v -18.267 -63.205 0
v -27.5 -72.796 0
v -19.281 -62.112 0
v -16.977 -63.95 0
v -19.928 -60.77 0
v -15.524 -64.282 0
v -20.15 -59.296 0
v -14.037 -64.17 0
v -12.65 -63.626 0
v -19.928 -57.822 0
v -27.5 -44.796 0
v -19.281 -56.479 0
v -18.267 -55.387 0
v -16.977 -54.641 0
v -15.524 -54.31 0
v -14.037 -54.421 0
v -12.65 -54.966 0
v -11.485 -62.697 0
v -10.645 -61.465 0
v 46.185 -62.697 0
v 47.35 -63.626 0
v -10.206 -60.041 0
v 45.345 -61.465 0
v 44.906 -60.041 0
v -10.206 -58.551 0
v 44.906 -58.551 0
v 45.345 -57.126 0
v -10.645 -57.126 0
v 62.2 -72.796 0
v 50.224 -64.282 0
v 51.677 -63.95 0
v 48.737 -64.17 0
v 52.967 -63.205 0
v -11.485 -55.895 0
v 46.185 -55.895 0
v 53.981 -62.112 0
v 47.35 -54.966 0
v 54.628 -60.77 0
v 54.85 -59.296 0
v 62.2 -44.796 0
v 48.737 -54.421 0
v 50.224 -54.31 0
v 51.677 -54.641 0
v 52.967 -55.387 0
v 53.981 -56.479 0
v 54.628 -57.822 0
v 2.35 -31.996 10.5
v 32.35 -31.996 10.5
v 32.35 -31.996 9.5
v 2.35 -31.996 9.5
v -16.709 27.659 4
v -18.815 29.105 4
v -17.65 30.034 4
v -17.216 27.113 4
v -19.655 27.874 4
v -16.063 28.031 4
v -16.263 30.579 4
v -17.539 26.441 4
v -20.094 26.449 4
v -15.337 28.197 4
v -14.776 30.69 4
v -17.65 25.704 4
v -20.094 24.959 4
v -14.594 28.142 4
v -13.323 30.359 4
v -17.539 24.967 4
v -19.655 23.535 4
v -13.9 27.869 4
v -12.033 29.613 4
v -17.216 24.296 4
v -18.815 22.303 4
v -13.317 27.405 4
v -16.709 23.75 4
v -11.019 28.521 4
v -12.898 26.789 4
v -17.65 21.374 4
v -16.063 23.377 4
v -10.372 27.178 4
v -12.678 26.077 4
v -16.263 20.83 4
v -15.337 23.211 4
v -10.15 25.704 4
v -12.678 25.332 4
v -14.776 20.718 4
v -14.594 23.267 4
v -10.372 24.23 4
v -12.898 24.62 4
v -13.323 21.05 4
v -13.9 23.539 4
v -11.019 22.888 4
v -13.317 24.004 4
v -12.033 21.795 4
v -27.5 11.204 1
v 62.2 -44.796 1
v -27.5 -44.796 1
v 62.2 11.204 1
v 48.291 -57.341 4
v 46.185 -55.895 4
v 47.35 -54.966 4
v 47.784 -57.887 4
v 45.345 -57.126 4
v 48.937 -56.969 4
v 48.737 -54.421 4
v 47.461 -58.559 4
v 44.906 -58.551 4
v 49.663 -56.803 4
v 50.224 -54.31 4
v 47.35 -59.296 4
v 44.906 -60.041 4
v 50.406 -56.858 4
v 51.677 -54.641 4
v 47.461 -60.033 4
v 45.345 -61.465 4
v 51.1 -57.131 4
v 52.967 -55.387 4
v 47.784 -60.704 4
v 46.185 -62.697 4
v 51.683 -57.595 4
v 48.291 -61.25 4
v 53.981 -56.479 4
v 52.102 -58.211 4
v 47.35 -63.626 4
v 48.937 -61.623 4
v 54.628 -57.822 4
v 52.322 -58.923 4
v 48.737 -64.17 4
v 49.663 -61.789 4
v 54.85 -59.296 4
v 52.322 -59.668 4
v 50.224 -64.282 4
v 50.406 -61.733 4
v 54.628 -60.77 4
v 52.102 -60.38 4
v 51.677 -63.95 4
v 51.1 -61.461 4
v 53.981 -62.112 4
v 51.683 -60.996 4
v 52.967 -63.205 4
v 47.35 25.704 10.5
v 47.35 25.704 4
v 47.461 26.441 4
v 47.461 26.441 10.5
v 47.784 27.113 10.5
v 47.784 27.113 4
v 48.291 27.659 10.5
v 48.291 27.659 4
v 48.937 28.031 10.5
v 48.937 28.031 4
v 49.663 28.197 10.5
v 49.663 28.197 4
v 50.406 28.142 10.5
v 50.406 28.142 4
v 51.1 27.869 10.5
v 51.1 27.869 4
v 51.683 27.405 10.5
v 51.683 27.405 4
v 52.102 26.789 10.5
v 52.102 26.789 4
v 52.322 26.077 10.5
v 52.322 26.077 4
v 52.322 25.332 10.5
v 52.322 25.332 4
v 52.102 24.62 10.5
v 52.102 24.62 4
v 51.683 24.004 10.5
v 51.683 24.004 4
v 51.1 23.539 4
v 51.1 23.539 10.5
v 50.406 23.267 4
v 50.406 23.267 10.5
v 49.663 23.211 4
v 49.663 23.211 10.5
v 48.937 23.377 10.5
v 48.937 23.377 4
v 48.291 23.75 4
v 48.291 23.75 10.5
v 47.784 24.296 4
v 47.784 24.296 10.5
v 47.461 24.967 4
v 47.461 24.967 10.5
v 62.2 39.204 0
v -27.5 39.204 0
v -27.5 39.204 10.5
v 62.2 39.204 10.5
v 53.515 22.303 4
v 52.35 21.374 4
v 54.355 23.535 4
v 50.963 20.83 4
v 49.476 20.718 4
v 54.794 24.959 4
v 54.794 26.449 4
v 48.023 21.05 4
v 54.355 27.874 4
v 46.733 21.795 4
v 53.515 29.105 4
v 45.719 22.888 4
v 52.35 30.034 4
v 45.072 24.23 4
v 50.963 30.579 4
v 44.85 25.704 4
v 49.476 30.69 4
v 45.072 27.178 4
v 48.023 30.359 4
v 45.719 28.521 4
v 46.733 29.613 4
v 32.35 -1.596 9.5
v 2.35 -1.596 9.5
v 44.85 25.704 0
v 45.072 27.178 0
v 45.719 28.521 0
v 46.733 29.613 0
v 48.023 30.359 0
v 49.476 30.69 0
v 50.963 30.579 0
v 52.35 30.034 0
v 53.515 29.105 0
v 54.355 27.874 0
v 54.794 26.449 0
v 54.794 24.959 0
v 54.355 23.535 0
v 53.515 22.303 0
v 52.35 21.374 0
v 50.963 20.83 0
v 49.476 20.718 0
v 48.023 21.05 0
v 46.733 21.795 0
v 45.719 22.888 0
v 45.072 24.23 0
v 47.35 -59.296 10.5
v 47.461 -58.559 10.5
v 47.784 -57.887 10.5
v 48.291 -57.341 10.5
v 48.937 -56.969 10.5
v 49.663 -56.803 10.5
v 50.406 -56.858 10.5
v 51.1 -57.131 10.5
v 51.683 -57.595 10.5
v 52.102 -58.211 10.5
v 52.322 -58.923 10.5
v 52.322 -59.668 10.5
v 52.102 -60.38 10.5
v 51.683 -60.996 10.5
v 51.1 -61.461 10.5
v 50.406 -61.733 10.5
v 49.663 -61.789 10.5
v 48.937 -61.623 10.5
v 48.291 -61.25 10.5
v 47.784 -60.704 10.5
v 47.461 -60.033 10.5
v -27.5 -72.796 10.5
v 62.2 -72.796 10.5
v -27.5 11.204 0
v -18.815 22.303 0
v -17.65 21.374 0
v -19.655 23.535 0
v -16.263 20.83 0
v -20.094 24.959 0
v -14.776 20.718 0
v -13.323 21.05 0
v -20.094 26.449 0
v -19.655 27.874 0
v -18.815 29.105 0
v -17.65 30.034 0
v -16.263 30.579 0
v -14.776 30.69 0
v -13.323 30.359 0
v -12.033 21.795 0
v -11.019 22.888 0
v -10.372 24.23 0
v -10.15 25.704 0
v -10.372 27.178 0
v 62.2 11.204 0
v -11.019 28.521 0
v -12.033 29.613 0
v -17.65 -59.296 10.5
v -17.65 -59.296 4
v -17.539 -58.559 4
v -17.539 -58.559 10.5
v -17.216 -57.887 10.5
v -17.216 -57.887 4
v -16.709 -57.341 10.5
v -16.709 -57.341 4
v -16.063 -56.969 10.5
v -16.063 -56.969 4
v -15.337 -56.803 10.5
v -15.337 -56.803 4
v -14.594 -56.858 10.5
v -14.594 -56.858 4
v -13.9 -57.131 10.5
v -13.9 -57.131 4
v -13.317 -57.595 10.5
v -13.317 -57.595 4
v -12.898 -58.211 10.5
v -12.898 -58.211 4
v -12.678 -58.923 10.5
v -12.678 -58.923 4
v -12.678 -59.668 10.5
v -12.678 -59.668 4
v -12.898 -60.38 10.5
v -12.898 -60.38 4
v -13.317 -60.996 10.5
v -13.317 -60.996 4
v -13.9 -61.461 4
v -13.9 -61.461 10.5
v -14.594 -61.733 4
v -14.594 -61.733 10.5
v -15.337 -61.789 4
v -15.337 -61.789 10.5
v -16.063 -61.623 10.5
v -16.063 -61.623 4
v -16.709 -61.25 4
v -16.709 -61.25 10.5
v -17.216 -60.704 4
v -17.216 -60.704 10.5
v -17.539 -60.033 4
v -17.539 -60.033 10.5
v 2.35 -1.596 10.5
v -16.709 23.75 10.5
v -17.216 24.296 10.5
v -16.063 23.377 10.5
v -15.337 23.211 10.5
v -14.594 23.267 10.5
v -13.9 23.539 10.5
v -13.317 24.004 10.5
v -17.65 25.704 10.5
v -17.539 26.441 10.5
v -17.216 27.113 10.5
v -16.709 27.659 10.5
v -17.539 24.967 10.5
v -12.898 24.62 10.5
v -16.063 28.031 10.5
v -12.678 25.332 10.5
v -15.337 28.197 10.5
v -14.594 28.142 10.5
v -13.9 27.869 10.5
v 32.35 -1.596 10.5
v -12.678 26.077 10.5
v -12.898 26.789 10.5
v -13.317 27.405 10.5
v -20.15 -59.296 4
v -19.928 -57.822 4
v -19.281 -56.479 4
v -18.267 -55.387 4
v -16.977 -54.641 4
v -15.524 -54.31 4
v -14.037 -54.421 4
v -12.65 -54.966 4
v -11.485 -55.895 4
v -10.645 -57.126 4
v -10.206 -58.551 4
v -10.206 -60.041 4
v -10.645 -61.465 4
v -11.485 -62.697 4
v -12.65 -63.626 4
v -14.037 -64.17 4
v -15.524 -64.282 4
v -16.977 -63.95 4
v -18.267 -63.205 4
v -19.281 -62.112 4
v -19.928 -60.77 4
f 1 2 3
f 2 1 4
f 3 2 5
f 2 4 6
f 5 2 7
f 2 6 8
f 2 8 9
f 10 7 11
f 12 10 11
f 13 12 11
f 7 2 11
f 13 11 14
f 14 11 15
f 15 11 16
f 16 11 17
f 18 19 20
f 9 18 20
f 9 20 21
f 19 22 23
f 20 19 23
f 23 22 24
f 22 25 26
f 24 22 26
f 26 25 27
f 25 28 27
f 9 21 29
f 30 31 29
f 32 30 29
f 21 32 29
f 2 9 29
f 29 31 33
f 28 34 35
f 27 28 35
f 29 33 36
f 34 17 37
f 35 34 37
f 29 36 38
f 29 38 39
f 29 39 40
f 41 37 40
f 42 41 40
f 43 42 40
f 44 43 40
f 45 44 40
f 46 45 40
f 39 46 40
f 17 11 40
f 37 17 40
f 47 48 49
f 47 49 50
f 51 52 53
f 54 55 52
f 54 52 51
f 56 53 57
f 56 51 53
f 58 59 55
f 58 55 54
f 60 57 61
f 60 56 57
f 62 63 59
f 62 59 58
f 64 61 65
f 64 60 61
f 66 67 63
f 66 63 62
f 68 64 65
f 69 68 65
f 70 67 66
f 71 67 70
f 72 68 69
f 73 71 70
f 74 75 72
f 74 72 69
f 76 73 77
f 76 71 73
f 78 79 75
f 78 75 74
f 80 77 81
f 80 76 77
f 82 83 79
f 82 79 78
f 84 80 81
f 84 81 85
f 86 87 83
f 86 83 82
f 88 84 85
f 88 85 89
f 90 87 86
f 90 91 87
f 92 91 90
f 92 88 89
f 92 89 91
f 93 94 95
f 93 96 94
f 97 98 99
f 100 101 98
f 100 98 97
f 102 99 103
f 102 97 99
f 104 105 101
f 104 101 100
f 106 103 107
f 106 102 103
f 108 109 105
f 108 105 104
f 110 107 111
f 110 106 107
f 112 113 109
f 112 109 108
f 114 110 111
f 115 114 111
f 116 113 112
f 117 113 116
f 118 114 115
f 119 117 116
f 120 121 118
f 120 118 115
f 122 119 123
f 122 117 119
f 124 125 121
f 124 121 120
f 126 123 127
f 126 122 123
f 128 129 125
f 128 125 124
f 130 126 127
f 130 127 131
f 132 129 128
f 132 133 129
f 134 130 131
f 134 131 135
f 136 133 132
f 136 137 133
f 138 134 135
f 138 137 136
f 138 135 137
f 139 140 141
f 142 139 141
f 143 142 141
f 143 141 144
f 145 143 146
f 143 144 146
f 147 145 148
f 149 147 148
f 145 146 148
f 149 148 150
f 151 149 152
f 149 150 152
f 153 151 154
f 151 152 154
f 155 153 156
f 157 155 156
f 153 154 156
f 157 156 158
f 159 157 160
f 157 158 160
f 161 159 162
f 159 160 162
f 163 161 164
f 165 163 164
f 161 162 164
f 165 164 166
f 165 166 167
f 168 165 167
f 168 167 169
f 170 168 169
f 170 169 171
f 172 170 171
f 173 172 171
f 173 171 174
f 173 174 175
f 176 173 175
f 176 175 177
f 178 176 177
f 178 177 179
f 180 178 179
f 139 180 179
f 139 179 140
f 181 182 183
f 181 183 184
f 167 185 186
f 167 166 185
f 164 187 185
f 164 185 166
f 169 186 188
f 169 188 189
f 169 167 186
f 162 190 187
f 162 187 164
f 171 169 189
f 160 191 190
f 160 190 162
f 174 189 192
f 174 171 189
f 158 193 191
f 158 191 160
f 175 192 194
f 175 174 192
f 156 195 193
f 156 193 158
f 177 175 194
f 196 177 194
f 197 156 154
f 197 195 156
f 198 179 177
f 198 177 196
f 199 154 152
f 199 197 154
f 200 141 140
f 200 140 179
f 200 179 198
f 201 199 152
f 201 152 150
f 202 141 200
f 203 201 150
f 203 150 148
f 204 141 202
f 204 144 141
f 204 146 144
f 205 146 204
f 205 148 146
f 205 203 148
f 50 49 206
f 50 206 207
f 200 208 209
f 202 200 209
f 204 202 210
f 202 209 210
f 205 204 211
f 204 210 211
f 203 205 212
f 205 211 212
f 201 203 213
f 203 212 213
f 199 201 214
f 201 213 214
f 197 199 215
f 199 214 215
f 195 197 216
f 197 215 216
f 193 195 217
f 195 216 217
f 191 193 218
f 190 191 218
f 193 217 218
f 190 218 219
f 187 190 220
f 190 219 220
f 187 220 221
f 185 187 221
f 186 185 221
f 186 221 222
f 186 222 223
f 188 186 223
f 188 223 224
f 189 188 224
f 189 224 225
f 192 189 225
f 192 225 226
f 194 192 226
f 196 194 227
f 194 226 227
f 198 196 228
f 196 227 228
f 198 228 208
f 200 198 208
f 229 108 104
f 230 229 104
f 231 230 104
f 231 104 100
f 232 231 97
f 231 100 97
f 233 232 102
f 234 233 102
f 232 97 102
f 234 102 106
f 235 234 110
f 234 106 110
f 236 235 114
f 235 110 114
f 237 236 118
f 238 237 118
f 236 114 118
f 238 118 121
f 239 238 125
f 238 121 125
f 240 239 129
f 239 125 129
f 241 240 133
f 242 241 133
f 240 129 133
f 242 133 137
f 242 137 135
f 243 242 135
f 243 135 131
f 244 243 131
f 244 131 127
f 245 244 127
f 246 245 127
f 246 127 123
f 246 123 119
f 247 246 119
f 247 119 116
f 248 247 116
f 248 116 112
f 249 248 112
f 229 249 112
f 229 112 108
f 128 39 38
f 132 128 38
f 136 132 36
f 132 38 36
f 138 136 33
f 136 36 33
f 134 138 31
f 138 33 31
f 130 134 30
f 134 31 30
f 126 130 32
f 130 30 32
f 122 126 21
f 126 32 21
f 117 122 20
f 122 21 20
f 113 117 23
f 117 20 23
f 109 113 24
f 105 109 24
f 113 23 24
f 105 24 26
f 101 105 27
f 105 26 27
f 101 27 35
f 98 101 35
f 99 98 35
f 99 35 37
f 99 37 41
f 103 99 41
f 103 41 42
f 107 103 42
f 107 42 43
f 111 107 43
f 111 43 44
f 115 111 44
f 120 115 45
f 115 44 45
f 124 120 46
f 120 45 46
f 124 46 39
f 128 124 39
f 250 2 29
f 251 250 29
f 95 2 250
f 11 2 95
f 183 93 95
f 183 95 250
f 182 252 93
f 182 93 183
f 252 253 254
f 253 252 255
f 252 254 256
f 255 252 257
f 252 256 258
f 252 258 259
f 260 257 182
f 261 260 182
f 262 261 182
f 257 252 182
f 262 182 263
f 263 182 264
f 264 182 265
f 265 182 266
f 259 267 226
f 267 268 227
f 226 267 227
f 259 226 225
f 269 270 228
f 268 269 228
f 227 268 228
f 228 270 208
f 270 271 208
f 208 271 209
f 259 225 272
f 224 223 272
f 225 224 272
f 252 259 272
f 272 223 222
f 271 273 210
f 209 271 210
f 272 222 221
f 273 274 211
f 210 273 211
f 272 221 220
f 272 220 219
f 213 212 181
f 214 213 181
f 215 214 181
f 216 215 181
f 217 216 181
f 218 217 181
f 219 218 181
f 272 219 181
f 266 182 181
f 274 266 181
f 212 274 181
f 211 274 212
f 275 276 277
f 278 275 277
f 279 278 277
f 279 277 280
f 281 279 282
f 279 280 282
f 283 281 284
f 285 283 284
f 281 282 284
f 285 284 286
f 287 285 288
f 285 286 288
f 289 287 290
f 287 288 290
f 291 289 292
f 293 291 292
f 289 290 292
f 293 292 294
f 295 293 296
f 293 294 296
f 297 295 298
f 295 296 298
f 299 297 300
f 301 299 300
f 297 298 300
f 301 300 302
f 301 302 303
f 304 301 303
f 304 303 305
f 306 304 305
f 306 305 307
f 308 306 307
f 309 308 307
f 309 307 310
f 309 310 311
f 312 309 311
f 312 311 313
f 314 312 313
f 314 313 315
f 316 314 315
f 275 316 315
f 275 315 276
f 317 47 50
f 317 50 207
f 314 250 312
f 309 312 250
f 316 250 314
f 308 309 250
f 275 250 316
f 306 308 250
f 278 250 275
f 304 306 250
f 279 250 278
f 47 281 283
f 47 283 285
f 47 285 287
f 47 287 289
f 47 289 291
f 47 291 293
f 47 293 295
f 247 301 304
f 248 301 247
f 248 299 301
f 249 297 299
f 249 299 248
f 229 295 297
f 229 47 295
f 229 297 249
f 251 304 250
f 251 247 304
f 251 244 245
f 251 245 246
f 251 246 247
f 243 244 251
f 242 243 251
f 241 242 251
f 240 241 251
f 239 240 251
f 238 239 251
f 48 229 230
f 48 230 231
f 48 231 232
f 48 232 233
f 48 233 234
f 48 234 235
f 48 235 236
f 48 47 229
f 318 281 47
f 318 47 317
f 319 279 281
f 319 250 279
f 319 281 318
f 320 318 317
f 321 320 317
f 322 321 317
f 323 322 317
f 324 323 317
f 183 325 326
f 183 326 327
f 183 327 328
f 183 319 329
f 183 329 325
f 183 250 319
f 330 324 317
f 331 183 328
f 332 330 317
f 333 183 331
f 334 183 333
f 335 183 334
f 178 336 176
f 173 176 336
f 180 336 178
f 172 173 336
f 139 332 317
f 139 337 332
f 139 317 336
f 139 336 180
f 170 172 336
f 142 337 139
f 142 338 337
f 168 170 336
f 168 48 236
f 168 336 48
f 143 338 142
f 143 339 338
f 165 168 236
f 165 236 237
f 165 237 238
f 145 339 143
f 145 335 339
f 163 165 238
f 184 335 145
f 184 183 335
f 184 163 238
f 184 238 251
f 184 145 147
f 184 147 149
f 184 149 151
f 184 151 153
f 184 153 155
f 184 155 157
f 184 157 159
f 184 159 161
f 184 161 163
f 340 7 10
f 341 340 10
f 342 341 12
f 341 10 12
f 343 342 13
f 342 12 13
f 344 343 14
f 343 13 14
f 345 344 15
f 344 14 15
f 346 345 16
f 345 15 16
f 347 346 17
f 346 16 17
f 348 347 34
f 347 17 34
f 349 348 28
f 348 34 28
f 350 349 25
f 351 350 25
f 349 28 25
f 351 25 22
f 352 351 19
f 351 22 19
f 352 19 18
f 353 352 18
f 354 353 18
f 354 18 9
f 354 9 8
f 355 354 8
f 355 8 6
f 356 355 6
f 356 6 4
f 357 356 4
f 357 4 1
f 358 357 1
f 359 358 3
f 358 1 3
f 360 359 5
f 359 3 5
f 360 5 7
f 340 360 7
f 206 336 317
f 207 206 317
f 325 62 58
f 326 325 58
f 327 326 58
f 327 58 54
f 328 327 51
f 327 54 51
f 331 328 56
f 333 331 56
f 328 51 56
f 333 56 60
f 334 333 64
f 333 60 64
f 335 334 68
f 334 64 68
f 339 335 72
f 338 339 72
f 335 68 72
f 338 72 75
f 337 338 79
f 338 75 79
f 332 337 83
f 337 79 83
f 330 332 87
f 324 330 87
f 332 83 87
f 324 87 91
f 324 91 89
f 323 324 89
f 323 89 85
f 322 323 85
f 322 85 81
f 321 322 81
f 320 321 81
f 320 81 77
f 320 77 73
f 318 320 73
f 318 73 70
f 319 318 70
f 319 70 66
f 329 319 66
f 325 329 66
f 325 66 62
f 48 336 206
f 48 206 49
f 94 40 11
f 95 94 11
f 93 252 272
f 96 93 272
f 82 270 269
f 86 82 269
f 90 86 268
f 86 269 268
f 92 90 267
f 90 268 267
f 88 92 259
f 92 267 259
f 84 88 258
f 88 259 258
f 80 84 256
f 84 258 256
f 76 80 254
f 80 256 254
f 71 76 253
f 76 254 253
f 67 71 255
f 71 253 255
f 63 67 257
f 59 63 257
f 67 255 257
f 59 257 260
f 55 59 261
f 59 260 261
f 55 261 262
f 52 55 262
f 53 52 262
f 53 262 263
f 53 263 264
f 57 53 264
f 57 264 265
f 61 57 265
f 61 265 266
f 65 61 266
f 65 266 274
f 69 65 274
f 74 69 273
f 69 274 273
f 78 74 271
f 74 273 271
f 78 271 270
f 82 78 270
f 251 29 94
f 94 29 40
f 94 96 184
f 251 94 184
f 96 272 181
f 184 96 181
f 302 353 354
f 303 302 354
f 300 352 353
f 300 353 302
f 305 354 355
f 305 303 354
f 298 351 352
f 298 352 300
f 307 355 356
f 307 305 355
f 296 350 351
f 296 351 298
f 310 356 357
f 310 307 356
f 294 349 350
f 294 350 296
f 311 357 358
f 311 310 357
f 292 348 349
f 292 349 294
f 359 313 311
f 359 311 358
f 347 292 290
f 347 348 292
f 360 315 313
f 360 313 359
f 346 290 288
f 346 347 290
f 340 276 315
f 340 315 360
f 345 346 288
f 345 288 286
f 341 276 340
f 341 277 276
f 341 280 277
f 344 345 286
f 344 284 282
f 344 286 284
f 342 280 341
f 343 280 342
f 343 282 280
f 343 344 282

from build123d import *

# Parameters (mm, degrees)
SKETCH_1_W          = 89.7
SKETCH_1_H          = 112
EXTRUDE_1_DEPTH     = 10.5
CUT_EXTRUDE_1_DEPTH = 1
CUT_EXTRUDE_2_DEPTH = 1
SKETCH_4_R          = 5
CUT_EXTRUDE_3_DEPTH = 4
SKETCH_15_R         = 2.5
CUT_EXTRUDE_4_DEPTH = 10


with BuildPart() as part:
    # 草图1 → 凸台-拉伸1 (new body)
    with BuildSketch(Plane.XY):
        with Locations((17.35, -16.795754715)):
            Rectangle(SKETCH_1_W, SKETCH_1_H)
    extrude(amount=EXTRUDE_1_DEPTH)

    # 草图2 → 切除-拉伸1 (cut)
    with BuildSketch(Plane.XY.offset(10.5)):
        Polygon((17.35, -1.595754715), (32.35, -1.595754715), (32.35, -31.995754715), (2.35, -31.995754715), (2.35, -1.595754715), align=None)
    extrude(amount=-CUT_EXTRUDE_1_DEPTH, mode=Mode.SUBTRACT)

    # 草图3 → 切除-拉伸2 (cut)
    with BuildSketch(Plane(origin=(0, 0, 0), x_dir=(-1, 0, 0), z_dir=(0, 0, -1))):
        Polygon((-62.2, -16.795754715), (-62.2, -44.795754715), (27.5, -44.795754715), (27.5, 11.204245285), (-62.2, 11.204245285), align=None)
    extrude(amount=-CUT_EXTRUDE_2_DEPTH, mode=Mode.SUBTRACT)

    # 草图4 → 切除-拉伸3 (cut)
    with BuildSketch(Plane(origin=(0, 0, 0), x_dir=(-1, 0, 0), z_dir=(0, 0, -1))):
        with Locations((-49.85, 25.704245285)):
            Circle(SKETCH_4_R)
        with Locations(Location((15.15, 25.704245285, 0), (0, 0, 180))):
            Circle(SKETCH_4_R)
        with Locations((15.15, -59.295754715)):
            Circle(SKETCH_4_R)
        with Locations(Location((-49.85, -59.295754715, 0), (0, 0, 180))):
            Circle(SKETCH_4_R)
    extrude(amount=-CUT_EXTRUDE_3_DEPTH, mode=Mode.SUBTRACT)

    # 草图15 → 切除-拉伸4 (cut)
    with BuildSketch(Plane(origin=(0, 0, 4), x_dir=(-1, 0, 0), z_dir=(0, 0, -1))):
        with Locations((-49.85, 25.704245285)):
            Circle(SKETCH_15_R)
        with Locations((15.15, 25.704245285)):
            Circle(SKETCH_15_R)
        with Locations((-49.85, -59.295754715)):
            Circle(SKETCH_15_R)
        with Locations((15.15, -59.295754715)):
            Circle(SKETCH_15_R)
    extrude(amount=-CUT_EXTRUDE_4_DEPTH, mode=Mode.SUBTRACT)


solid = part.part
